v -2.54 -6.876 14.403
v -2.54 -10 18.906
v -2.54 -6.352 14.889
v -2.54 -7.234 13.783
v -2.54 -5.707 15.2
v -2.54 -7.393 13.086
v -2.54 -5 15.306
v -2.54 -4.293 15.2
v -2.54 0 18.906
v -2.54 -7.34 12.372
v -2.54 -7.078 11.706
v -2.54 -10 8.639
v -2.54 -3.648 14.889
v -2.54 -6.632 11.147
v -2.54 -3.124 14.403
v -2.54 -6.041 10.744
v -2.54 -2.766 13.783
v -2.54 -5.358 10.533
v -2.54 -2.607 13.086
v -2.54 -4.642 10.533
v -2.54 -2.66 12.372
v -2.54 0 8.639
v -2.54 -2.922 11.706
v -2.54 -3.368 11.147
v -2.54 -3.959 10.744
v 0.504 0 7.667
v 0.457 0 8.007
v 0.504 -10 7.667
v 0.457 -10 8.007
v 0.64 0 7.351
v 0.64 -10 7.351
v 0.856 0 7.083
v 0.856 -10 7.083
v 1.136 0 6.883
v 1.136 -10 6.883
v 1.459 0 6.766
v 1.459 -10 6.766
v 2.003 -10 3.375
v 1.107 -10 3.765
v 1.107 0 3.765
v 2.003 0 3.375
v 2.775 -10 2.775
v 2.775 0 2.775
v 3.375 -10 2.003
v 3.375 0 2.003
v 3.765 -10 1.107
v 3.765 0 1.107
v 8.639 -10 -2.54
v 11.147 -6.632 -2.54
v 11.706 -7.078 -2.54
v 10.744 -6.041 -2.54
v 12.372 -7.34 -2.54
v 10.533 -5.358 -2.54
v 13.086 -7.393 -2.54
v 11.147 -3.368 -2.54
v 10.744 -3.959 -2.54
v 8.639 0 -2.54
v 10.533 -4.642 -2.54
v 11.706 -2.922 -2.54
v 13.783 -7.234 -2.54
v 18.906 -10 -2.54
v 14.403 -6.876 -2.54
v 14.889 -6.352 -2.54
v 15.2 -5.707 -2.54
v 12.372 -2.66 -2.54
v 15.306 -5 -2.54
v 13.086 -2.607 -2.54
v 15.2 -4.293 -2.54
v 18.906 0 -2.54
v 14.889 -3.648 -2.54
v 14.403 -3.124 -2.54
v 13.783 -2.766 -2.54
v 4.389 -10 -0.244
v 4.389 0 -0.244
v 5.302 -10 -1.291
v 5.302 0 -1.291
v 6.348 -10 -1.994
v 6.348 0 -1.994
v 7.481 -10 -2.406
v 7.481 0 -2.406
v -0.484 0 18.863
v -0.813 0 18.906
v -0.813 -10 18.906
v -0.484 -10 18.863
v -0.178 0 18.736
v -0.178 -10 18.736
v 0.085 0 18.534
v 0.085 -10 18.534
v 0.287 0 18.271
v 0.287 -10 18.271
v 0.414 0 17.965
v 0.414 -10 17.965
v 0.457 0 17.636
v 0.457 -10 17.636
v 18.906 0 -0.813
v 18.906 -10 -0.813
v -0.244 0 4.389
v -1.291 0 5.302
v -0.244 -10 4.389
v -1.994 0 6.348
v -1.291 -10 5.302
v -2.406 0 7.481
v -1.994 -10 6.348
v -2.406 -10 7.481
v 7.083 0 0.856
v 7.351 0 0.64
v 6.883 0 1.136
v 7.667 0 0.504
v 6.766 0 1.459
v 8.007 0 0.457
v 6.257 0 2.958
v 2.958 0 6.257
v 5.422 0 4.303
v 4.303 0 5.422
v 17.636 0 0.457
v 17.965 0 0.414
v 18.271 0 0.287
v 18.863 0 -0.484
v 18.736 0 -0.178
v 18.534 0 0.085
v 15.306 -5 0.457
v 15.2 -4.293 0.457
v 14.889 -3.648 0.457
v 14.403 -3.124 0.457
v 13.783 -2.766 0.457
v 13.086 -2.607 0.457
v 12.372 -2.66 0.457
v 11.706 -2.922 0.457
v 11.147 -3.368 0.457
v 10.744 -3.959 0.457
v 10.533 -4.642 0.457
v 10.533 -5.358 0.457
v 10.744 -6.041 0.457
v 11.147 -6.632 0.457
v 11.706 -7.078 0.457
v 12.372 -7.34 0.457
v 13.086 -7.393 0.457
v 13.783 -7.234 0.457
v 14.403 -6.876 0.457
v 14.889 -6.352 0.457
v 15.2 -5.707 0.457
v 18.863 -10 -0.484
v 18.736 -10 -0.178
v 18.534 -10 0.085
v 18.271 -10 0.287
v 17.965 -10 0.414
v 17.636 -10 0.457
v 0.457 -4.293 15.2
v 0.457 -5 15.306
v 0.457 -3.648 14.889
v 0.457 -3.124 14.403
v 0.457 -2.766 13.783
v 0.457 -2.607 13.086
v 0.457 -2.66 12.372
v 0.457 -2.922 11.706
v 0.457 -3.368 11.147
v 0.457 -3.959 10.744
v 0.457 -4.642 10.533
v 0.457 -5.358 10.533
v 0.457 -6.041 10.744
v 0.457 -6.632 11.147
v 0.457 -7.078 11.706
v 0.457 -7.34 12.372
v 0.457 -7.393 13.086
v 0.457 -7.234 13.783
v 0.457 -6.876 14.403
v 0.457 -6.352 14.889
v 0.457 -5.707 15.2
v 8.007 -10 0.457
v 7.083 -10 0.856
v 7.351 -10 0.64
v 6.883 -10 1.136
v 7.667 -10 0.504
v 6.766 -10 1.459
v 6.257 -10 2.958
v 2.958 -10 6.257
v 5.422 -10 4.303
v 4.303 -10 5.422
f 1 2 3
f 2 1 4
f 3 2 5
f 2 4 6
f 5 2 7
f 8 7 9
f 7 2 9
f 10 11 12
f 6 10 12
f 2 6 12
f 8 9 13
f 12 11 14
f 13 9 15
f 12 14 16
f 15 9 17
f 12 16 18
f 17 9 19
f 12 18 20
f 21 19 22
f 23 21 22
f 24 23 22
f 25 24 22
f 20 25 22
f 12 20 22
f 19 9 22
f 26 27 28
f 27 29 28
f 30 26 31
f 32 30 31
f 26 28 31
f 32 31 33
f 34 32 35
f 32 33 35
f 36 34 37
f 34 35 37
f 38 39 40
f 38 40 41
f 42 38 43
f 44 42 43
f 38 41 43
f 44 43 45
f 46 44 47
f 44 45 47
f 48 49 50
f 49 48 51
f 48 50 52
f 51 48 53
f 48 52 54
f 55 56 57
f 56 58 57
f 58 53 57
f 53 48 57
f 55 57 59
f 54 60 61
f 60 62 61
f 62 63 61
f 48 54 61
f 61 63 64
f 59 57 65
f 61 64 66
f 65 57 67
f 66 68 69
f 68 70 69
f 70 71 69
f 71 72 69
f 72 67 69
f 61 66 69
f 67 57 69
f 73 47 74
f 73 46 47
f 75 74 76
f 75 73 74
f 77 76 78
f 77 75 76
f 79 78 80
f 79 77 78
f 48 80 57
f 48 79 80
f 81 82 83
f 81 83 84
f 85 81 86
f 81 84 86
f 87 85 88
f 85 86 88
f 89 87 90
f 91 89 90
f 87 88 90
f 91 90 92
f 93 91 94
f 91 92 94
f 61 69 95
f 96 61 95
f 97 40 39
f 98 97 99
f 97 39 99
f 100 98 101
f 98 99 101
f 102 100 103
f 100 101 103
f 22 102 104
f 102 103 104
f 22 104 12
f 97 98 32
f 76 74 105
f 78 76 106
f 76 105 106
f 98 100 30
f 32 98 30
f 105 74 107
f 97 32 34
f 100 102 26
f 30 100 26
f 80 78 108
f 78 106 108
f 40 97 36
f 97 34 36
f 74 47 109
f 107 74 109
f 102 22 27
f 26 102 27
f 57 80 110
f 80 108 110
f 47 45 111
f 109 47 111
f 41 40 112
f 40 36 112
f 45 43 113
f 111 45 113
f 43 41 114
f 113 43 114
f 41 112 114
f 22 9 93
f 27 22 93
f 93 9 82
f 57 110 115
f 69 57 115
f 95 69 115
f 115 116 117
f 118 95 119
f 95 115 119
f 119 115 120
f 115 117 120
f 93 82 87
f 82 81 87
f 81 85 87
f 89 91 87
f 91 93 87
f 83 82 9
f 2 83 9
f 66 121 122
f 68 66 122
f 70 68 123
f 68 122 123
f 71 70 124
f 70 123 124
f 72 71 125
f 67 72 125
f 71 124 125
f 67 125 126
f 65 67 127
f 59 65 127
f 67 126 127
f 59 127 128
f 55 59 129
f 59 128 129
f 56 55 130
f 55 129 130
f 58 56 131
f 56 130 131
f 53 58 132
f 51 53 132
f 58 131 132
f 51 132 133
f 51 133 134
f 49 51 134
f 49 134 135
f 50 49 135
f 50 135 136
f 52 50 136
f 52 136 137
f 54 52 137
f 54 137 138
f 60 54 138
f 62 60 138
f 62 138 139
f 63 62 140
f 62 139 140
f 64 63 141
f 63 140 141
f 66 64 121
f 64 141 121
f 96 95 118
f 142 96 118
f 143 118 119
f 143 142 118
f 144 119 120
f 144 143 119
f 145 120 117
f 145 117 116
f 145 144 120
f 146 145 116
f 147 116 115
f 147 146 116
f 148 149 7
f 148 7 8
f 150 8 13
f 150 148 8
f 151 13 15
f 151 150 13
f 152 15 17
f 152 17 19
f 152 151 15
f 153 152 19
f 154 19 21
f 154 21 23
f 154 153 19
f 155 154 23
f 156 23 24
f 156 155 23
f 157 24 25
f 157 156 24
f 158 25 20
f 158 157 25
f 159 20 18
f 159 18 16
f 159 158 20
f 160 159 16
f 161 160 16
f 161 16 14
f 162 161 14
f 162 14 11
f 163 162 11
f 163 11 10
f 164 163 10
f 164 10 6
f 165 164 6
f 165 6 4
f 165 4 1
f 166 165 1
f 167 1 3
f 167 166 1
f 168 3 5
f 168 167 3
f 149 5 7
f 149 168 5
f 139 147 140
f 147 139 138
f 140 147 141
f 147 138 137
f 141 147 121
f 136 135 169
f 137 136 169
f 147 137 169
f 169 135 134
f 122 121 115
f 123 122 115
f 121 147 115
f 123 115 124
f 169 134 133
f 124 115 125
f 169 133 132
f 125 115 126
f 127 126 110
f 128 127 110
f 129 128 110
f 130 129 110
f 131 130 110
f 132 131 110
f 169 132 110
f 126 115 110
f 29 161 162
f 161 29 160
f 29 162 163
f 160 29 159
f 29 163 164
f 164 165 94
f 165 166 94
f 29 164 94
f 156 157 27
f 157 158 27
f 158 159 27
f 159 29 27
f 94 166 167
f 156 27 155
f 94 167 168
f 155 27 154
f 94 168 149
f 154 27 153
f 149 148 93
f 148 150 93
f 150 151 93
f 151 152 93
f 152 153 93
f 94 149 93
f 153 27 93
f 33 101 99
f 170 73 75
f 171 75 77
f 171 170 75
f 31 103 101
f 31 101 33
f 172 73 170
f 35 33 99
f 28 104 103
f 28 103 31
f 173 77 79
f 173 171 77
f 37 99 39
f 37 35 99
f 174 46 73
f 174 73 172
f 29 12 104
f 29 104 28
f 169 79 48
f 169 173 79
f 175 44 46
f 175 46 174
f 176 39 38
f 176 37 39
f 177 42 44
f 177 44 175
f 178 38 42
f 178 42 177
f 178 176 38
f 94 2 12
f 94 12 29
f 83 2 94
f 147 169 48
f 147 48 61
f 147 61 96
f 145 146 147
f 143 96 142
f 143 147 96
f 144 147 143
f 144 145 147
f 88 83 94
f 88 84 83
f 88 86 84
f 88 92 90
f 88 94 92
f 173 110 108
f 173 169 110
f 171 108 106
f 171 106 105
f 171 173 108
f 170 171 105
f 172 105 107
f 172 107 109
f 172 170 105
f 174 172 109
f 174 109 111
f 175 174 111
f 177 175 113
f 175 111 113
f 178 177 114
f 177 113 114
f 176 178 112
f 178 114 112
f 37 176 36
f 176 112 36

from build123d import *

# Parameters (mm, degrees)
F1_DEPTH = 10
F2_R     = 2.4
F3_DEPTH = 2.9972
F7_R     = 5.08
F8_R     = 1.27


# Not quite as in the source:
# - a pattern or mirror of a feature is missing from the dataset's text; its kind, count and spacing are read off the source's solid


with BuildPart() as f1:
    # F0 (on Front) → F1 (new body)
    with BuildSketch(Plane.XZ):
        with BuildLine():
            ThreePointArc((0, 3.9243), (2.7748991414, 2.7748991414), (3.9243, 0))
            Line((3.9243, 0), (3.9243, -2.54))
            Line((3.9243, -2.54), (18.9063833089, -2.54))
            Line((18.9063833089, -2.54), (18.9063833089, 0.4572))
            Line((18.9063833089, 0.4572), (6.9063833089, 0.4572))
            ThreePointArc((6.9063833089, 0.4572), (4.894239586, 4.894239586), (0.4572, 6.9063833089))
            Line((0.4572, 6.9063833089), (0.4572, 18.9063833089))
            Line((0.4572, 18.9063833089), (-2.54, 18.9063833089))
            Line((-2.54, 18.9063833089), (-2.54, 3.9243))
            Line((-2.54, 3.9243), (0, 3.9243))
        make_face()
    extrude(amount=F1_DEPTH)

    # F2 (on face) → F3 (cut, through all)
    with BuildSketch(Plane.XY.offset(0.4572)):
        with Locations((12.9063833089, -5)):
            Circle(F2_R)
    f3 = extrude(amount=-F3_DEPTH, mode=Mode.SUBTRACT)

    # F3_copies: F3 across plane
    add(f3.mirror(Plane(origin=(0, 0, 0), x_dir=(-0.7071067812, 0, -0.7071067812), z_dir=(-0.7071067812, 0, 0.7071067812))), mode=Mode.SUBTRACT)

    # F7
    f7_edges = [f1.edges().sort_by_distance(p)[0] for p in [
        (-2.54, -5, 3.9243),
        (3.9243, -5, -2.54),
    ]]
    fillet(f7_edges, radius=F7_R)

    # F8
    f8_edges = [f1.edges().sort_by_distance(p)[0] for p in [
        (0.4572, -5, 18.906383),
        (0.4572, -5, 6.906383),
        (6.906383, -5, 0.4572),
        (18.906383, -5, 0.4572),
    ]]
    fillet(f8_edges, radius=F8_R)


solid = f1.part
